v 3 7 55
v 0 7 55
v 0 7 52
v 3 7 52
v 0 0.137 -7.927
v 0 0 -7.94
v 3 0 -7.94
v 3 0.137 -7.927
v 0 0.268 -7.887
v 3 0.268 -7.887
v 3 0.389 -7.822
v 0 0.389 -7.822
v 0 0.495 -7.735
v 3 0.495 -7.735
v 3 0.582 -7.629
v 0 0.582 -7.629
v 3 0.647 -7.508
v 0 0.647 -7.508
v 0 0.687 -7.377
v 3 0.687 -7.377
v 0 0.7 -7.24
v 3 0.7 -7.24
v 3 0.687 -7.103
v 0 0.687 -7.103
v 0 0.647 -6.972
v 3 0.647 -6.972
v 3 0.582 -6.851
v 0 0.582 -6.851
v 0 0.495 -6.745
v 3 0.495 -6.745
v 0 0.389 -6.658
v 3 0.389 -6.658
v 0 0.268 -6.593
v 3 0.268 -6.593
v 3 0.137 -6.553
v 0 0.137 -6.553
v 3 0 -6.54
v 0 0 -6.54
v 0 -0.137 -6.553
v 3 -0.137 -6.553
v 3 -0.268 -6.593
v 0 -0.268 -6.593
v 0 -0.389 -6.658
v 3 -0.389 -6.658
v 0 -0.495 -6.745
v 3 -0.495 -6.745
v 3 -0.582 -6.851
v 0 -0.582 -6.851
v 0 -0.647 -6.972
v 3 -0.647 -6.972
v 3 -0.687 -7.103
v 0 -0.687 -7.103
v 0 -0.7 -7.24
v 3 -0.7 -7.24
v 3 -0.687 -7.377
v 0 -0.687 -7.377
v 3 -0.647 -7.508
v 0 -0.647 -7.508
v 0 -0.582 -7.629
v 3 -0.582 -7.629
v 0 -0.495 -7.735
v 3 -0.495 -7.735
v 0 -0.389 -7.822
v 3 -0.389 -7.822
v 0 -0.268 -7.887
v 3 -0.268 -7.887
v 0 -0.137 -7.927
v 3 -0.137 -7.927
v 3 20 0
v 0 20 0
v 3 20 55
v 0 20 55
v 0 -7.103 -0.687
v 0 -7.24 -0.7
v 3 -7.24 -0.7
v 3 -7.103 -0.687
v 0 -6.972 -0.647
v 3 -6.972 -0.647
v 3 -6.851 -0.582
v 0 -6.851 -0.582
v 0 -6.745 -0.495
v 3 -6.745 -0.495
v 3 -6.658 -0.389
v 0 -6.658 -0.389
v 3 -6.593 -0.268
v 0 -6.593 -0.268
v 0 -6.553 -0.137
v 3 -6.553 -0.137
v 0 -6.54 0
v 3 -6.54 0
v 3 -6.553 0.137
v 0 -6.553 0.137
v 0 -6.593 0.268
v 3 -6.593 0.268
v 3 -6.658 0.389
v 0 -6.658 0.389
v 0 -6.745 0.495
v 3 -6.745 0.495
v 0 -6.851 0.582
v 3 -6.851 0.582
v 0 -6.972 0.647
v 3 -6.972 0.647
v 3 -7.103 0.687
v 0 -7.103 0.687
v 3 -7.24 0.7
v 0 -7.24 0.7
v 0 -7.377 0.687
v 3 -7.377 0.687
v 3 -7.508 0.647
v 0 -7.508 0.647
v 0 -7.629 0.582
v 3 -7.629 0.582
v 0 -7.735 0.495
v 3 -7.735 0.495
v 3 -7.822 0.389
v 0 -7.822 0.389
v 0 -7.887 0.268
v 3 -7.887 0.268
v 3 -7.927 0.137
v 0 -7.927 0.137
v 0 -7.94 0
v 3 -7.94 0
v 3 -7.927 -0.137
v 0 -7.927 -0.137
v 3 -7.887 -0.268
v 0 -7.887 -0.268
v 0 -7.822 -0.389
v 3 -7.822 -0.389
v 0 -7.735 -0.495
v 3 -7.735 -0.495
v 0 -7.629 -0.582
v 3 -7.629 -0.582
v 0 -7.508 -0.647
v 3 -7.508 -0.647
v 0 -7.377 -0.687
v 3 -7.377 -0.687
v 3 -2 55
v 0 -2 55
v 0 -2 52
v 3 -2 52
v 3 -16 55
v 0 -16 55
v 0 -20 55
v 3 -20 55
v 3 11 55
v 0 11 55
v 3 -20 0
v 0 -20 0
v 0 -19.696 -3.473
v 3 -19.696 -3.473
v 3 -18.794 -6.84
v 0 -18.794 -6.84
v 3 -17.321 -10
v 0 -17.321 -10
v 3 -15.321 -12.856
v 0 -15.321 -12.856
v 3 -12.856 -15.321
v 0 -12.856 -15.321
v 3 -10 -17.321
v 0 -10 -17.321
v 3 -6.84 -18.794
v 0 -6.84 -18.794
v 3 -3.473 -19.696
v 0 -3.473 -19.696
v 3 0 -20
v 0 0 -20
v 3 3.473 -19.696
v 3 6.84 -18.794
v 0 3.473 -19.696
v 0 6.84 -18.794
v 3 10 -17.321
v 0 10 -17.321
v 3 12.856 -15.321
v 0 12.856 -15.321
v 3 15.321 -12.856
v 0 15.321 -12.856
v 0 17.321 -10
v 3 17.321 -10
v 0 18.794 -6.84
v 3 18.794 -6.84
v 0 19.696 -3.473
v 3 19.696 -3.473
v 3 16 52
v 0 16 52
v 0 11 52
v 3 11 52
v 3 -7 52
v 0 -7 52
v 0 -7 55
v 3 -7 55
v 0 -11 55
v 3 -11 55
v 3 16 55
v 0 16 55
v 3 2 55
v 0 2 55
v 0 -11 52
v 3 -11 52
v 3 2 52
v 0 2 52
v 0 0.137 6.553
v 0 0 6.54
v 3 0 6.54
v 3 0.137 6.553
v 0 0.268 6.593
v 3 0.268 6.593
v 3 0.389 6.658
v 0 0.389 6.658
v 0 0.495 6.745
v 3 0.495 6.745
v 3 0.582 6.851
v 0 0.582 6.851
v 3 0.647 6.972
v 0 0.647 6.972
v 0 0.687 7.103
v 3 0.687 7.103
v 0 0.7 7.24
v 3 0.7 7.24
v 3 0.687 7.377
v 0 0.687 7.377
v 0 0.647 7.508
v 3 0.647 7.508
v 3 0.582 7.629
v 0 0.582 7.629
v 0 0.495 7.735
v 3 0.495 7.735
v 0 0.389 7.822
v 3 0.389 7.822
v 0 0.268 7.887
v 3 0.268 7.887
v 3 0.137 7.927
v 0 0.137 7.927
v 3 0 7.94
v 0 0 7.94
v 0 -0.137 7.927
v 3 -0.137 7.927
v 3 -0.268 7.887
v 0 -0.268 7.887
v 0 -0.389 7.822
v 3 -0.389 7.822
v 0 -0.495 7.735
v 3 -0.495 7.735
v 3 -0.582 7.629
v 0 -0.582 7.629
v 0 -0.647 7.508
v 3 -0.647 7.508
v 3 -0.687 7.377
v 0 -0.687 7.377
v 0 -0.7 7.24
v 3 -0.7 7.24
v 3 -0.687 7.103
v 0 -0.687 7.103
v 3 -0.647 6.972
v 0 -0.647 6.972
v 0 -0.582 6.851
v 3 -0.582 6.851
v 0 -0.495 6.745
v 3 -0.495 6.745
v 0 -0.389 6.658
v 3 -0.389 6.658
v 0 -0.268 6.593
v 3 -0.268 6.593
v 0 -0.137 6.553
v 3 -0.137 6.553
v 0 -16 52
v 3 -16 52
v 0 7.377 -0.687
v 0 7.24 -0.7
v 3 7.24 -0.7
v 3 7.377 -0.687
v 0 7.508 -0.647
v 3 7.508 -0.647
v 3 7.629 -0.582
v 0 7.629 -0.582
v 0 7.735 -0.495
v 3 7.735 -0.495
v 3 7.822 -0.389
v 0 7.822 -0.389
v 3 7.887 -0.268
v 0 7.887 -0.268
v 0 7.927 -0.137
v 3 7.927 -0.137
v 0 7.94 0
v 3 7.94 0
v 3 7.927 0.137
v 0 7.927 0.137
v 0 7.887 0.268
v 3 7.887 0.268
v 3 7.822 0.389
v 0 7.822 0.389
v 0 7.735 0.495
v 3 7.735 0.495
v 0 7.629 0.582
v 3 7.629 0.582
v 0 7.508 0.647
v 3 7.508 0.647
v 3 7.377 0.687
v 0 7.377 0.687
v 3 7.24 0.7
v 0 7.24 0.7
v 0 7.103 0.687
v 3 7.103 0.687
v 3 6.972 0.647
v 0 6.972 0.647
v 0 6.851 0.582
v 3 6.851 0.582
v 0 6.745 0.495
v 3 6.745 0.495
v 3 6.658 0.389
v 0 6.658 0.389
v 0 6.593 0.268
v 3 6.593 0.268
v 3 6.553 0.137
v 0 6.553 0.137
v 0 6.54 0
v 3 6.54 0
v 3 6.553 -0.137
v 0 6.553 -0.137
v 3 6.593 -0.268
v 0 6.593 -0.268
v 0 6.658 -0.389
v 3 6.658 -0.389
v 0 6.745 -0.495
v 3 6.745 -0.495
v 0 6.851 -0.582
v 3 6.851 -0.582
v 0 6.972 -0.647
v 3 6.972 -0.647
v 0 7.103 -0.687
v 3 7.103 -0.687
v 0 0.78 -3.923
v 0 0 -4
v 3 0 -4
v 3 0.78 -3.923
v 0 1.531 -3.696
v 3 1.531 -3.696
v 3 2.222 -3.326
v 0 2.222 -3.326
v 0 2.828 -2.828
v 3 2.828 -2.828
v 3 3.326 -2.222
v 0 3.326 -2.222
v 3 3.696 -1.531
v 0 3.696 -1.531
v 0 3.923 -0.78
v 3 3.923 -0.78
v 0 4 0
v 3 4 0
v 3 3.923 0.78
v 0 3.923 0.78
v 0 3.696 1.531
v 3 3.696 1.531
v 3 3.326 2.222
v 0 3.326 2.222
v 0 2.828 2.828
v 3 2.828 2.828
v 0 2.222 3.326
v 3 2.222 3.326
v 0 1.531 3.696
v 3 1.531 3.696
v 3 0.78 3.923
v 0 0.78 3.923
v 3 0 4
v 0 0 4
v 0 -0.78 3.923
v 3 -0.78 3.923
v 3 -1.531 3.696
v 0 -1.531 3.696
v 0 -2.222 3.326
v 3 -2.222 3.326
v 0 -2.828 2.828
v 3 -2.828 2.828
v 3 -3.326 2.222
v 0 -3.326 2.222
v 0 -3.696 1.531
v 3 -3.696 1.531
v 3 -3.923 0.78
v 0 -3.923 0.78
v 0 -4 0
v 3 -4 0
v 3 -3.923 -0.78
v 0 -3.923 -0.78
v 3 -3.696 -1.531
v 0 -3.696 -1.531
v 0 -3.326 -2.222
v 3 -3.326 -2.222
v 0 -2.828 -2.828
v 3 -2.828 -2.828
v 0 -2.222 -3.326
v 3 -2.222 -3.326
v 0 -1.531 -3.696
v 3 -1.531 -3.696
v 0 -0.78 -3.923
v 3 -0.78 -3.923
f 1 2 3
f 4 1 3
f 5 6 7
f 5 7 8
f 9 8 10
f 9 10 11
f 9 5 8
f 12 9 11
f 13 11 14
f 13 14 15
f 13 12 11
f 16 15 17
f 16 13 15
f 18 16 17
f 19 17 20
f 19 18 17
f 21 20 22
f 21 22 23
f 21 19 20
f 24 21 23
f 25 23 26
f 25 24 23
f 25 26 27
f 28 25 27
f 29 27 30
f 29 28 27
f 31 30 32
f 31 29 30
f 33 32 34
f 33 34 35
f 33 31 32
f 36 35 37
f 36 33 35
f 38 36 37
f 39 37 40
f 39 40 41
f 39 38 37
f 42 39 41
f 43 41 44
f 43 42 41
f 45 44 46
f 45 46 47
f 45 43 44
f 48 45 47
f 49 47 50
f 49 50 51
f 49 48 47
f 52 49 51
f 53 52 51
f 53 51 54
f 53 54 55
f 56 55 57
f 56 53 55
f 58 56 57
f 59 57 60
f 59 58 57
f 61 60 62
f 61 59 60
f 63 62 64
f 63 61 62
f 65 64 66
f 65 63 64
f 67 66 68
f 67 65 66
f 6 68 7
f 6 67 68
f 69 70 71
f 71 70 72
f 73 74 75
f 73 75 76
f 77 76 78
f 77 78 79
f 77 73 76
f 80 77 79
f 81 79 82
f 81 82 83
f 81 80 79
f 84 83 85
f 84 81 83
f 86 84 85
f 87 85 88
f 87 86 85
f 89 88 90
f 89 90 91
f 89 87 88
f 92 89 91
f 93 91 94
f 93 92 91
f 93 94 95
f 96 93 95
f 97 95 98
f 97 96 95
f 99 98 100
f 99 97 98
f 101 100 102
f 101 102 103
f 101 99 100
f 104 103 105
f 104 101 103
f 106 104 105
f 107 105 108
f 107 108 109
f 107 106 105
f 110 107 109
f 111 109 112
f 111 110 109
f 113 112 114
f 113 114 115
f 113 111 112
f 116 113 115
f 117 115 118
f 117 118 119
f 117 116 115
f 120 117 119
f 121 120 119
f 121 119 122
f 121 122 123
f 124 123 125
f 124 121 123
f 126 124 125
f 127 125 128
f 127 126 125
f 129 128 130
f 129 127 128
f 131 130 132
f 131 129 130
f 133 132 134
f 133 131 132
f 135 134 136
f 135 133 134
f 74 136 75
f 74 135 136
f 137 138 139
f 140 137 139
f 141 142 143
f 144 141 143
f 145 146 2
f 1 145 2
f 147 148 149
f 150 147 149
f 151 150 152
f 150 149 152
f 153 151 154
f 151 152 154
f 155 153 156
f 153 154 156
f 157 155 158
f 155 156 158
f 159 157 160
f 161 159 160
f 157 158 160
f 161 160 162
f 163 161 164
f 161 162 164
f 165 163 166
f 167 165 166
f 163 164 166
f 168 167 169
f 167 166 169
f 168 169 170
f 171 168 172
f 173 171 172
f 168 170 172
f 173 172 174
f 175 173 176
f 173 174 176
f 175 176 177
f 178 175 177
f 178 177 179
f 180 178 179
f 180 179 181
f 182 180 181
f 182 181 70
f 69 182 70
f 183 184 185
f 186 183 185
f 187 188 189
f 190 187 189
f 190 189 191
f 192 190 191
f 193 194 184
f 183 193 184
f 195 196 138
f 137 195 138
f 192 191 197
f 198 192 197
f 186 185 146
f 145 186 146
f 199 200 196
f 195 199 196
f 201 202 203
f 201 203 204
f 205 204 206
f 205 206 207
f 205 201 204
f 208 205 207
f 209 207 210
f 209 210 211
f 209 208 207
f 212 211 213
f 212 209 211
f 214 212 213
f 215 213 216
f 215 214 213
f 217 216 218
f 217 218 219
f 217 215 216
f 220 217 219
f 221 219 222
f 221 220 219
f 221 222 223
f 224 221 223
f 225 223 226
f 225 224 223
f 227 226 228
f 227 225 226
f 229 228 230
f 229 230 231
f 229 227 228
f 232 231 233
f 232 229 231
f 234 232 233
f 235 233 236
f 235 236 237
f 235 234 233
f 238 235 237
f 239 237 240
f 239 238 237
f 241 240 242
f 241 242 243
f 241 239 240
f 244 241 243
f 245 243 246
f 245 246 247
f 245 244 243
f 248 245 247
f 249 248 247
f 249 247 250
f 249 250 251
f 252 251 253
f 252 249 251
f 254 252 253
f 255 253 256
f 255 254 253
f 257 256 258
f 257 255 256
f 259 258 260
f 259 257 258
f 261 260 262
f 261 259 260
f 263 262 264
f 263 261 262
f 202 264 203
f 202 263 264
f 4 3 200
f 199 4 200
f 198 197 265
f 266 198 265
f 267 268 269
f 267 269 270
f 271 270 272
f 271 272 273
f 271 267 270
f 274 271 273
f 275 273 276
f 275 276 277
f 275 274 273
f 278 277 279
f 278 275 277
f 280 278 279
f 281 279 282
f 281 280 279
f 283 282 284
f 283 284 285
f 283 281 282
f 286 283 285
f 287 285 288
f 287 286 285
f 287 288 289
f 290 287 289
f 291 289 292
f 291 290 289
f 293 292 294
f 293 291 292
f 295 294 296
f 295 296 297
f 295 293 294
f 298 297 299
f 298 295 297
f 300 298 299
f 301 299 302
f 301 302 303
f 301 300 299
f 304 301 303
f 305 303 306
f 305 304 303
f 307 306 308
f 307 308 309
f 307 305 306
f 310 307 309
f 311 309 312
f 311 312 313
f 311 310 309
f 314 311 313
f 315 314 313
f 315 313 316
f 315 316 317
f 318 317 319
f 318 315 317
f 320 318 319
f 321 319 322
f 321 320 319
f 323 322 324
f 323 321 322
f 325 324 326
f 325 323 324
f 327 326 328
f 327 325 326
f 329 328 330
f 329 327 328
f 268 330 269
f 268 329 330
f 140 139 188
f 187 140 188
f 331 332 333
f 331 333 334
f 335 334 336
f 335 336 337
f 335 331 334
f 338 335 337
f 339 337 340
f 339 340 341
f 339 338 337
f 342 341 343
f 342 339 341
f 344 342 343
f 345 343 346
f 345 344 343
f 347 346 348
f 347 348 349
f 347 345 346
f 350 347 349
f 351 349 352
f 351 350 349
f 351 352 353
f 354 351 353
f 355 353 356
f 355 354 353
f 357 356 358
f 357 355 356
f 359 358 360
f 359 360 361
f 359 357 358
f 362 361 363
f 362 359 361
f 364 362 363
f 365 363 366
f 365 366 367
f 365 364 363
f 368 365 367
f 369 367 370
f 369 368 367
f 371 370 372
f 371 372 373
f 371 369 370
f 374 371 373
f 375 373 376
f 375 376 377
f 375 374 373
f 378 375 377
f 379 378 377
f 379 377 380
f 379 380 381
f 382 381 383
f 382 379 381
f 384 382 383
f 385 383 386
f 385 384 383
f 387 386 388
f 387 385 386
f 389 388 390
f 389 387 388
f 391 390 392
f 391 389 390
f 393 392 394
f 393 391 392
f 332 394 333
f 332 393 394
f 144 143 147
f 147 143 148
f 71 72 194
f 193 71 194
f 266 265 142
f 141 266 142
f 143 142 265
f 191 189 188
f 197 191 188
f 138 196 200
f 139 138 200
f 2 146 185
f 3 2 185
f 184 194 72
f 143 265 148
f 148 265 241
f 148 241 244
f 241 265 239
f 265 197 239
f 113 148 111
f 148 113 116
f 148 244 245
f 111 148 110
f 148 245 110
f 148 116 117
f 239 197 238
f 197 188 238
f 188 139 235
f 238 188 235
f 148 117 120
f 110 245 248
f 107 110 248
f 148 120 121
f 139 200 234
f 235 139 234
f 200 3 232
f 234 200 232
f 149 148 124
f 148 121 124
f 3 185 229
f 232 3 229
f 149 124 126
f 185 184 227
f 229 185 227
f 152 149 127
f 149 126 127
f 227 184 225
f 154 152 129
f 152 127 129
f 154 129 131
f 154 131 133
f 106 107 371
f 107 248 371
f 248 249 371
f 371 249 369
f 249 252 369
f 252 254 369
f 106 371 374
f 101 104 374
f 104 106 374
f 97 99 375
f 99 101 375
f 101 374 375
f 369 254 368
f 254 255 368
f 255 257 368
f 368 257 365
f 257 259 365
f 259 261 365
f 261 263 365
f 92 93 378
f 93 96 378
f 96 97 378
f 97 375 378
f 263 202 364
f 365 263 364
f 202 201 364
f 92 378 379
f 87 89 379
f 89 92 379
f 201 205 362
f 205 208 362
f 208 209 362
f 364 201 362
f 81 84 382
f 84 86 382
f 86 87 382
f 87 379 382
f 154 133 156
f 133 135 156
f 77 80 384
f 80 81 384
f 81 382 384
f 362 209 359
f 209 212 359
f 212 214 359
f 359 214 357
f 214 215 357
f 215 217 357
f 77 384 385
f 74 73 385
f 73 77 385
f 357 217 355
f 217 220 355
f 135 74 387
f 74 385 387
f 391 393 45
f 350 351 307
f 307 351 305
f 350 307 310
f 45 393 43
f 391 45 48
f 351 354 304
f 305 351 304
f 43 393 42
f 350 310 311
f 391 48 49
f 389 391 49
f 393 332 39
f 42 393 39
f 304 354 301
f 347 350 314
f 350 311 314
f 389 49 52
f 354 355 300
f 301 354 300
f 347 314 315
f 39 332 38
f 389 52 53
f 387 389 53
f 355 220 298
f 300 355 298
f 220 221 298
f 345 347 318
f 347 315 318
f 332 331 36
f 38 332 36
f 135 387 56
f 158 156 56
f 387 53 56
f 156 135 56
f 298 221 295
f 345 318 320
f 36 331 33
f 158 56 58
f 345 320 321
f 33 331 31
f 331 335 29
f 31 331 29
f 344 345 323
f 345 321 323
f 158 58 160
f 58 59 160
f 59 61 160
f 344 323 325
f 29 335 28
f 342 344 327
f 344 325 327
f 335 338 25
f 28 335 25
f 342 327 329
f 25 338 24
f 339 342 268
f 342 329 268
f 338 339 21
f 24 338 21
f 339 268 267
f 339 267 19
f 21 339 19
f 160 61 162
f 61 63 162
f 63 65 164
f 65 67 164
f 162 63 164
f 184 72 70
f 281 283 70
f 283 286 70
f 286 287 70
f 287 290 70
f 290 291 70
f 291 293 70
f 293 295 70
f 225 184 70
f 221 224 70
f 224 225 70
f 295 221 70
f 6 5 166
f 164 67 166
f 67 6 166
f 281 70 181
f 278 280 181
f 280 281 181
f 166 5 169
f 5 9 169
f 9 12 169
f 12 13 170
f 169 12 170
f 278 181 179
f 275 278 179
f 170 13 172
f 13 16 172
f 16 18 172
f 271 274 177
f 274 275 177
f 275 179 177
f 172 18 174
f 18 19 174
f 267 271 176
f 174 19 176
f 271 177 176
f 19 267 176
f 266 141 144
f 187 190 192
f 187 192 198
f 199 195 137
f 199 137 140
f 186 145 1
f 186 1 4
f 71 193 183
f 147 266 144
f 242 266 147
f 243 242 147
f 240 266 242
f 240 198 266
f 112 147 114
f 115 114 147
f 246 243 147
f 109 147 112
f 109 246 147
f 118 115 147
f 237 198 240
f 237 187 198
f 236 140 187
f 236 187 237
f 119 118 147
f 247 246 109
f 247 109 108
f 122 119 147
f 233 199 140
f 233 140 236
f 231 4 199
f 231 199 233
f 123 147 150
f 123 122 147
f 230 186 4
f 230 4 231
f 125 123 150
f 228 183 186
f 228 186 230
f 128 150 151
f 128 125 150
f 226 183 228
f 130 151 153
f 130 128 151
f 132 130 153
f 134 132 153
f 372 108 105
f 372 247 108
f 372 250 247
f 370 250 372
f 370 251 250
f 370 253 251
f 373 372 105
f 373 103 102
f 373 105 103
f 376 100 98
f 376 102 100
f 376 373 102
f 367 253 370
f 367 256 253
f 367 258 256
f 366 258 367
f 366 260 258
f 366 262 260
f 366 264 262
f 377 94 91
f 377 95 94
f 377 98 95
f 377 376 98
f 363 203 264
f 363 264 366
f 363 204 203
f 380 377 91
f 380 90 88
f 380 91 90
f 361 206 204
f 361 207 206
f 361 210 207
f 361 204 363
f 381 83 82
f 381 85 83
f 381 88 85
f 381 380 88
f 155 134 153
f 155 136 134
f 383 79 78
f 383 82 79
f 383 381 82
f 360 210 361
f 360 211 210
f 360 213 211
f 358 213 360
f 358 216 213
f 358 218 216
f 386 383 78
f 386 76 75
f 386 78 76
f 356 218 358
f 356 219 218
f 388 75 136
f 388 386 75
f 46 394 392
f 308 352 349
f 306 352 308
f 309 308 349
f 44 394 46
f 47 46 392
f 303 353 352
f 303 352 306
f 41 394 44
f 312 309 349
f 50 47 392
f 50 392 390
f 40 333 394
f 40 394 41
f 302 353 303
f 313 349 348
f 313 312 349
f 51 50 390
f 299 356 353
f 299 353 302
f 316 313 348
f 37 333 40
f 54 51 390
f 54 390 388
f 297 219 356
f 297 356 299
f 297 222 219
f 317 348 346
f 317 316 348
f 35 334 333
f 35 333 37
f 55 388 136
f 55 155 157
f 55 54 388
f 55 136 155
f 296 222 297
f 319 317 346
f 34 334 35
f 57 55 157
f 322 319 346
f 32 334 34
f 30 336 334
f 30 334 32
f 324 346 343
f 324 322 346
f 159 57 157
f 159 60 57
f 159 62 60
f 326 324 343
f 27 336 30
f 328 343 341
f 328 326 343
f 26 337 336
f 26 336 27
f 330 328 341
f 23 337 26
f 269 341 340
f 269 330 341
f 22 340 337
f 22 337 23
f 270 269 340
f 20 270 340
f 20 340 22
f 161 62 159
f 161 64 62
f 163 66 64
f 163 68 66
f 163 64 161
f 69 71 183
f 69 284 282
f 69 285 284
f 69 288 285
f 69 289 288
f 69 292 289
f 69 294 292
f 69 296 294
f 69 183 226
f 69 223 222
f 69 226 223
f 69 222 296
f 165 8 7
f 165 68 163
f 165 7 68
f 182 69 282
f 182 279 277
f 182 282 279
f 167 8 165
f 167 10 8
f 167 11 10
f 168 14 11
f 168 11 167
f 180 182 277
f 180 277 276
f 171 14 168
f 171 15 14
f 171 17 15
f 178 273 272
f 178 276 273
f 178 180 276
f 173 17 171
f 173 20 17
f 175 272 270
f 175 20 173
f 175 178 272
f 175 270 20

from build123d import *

# Parameters (mm, degrees)
SKETCH1_R           = 4
SKETCH1_R_2         = 0.7
BOSS_EXTRUDE1_DEPTH = 3


with BuildPart() as part:
    # Sketch1 → Boss-Extrude1 (new body)
    with BuildSketch(Plane(origin=(0, 0, 0), x_dir=(0, 0, -1), z_dir=(1, 0, 0))):
        with BuildLine():
            Line((0, 20), (-55, 20))
            Line((-55, 20), (-55, 16))
            Line((-55, 16), (-52, 16))
            Line((-52, 16), (-52, 11))
            Line((-52, 11), (-55, 11))
            Line((-55, 11), (-55, 7))
            Line((-55, 7), (-52, 7))
            Line((-52, 7), (-52, 2))
            Line((-52, 2), (-55, 2))
            Line((-55, 2), (-55, -2))
            Line((-55, -2), (-52, -2))
            Line((-52, -2), (-52, -7))
            Line((-52, -7), (-55, -7))
            Line((-55, -7), (-55, -11))
            Line((-55, -11), (-52, -11))
            Line((-52, -11), (-52, -16))
            Line((-52, -16), (-55, -16))
            Line((-55, -16), (-55, -20))
            Line((-55, -20), (0, -20))
            ThreePointArc((0, -20), (20, 0), (0, 20))
        make_face()
        Circle(SKETCH1_R, mode=Mode.SUBTRACT)
        with Locations((-7.24, 0)):
            Circle(SKETCH1_R_2, mode=Mode.SUBTRACT)
        with Locations((0, 7.24)):
            Circle(SKETCH1_R_2, mode=Mode.SUBTRACT)
        with Locations((7.24, 0)):
            Circle(SKETCH1_R_2, mode=Mode.SUBTRACT)
        with Locations((0, -7.24)):
            Circle(SKETCH1_R_2, mode=Mode.SUBTRACT)
    extrude(amount=BOSS_EXTRUDE1_DEPTH)


solid = part.part
